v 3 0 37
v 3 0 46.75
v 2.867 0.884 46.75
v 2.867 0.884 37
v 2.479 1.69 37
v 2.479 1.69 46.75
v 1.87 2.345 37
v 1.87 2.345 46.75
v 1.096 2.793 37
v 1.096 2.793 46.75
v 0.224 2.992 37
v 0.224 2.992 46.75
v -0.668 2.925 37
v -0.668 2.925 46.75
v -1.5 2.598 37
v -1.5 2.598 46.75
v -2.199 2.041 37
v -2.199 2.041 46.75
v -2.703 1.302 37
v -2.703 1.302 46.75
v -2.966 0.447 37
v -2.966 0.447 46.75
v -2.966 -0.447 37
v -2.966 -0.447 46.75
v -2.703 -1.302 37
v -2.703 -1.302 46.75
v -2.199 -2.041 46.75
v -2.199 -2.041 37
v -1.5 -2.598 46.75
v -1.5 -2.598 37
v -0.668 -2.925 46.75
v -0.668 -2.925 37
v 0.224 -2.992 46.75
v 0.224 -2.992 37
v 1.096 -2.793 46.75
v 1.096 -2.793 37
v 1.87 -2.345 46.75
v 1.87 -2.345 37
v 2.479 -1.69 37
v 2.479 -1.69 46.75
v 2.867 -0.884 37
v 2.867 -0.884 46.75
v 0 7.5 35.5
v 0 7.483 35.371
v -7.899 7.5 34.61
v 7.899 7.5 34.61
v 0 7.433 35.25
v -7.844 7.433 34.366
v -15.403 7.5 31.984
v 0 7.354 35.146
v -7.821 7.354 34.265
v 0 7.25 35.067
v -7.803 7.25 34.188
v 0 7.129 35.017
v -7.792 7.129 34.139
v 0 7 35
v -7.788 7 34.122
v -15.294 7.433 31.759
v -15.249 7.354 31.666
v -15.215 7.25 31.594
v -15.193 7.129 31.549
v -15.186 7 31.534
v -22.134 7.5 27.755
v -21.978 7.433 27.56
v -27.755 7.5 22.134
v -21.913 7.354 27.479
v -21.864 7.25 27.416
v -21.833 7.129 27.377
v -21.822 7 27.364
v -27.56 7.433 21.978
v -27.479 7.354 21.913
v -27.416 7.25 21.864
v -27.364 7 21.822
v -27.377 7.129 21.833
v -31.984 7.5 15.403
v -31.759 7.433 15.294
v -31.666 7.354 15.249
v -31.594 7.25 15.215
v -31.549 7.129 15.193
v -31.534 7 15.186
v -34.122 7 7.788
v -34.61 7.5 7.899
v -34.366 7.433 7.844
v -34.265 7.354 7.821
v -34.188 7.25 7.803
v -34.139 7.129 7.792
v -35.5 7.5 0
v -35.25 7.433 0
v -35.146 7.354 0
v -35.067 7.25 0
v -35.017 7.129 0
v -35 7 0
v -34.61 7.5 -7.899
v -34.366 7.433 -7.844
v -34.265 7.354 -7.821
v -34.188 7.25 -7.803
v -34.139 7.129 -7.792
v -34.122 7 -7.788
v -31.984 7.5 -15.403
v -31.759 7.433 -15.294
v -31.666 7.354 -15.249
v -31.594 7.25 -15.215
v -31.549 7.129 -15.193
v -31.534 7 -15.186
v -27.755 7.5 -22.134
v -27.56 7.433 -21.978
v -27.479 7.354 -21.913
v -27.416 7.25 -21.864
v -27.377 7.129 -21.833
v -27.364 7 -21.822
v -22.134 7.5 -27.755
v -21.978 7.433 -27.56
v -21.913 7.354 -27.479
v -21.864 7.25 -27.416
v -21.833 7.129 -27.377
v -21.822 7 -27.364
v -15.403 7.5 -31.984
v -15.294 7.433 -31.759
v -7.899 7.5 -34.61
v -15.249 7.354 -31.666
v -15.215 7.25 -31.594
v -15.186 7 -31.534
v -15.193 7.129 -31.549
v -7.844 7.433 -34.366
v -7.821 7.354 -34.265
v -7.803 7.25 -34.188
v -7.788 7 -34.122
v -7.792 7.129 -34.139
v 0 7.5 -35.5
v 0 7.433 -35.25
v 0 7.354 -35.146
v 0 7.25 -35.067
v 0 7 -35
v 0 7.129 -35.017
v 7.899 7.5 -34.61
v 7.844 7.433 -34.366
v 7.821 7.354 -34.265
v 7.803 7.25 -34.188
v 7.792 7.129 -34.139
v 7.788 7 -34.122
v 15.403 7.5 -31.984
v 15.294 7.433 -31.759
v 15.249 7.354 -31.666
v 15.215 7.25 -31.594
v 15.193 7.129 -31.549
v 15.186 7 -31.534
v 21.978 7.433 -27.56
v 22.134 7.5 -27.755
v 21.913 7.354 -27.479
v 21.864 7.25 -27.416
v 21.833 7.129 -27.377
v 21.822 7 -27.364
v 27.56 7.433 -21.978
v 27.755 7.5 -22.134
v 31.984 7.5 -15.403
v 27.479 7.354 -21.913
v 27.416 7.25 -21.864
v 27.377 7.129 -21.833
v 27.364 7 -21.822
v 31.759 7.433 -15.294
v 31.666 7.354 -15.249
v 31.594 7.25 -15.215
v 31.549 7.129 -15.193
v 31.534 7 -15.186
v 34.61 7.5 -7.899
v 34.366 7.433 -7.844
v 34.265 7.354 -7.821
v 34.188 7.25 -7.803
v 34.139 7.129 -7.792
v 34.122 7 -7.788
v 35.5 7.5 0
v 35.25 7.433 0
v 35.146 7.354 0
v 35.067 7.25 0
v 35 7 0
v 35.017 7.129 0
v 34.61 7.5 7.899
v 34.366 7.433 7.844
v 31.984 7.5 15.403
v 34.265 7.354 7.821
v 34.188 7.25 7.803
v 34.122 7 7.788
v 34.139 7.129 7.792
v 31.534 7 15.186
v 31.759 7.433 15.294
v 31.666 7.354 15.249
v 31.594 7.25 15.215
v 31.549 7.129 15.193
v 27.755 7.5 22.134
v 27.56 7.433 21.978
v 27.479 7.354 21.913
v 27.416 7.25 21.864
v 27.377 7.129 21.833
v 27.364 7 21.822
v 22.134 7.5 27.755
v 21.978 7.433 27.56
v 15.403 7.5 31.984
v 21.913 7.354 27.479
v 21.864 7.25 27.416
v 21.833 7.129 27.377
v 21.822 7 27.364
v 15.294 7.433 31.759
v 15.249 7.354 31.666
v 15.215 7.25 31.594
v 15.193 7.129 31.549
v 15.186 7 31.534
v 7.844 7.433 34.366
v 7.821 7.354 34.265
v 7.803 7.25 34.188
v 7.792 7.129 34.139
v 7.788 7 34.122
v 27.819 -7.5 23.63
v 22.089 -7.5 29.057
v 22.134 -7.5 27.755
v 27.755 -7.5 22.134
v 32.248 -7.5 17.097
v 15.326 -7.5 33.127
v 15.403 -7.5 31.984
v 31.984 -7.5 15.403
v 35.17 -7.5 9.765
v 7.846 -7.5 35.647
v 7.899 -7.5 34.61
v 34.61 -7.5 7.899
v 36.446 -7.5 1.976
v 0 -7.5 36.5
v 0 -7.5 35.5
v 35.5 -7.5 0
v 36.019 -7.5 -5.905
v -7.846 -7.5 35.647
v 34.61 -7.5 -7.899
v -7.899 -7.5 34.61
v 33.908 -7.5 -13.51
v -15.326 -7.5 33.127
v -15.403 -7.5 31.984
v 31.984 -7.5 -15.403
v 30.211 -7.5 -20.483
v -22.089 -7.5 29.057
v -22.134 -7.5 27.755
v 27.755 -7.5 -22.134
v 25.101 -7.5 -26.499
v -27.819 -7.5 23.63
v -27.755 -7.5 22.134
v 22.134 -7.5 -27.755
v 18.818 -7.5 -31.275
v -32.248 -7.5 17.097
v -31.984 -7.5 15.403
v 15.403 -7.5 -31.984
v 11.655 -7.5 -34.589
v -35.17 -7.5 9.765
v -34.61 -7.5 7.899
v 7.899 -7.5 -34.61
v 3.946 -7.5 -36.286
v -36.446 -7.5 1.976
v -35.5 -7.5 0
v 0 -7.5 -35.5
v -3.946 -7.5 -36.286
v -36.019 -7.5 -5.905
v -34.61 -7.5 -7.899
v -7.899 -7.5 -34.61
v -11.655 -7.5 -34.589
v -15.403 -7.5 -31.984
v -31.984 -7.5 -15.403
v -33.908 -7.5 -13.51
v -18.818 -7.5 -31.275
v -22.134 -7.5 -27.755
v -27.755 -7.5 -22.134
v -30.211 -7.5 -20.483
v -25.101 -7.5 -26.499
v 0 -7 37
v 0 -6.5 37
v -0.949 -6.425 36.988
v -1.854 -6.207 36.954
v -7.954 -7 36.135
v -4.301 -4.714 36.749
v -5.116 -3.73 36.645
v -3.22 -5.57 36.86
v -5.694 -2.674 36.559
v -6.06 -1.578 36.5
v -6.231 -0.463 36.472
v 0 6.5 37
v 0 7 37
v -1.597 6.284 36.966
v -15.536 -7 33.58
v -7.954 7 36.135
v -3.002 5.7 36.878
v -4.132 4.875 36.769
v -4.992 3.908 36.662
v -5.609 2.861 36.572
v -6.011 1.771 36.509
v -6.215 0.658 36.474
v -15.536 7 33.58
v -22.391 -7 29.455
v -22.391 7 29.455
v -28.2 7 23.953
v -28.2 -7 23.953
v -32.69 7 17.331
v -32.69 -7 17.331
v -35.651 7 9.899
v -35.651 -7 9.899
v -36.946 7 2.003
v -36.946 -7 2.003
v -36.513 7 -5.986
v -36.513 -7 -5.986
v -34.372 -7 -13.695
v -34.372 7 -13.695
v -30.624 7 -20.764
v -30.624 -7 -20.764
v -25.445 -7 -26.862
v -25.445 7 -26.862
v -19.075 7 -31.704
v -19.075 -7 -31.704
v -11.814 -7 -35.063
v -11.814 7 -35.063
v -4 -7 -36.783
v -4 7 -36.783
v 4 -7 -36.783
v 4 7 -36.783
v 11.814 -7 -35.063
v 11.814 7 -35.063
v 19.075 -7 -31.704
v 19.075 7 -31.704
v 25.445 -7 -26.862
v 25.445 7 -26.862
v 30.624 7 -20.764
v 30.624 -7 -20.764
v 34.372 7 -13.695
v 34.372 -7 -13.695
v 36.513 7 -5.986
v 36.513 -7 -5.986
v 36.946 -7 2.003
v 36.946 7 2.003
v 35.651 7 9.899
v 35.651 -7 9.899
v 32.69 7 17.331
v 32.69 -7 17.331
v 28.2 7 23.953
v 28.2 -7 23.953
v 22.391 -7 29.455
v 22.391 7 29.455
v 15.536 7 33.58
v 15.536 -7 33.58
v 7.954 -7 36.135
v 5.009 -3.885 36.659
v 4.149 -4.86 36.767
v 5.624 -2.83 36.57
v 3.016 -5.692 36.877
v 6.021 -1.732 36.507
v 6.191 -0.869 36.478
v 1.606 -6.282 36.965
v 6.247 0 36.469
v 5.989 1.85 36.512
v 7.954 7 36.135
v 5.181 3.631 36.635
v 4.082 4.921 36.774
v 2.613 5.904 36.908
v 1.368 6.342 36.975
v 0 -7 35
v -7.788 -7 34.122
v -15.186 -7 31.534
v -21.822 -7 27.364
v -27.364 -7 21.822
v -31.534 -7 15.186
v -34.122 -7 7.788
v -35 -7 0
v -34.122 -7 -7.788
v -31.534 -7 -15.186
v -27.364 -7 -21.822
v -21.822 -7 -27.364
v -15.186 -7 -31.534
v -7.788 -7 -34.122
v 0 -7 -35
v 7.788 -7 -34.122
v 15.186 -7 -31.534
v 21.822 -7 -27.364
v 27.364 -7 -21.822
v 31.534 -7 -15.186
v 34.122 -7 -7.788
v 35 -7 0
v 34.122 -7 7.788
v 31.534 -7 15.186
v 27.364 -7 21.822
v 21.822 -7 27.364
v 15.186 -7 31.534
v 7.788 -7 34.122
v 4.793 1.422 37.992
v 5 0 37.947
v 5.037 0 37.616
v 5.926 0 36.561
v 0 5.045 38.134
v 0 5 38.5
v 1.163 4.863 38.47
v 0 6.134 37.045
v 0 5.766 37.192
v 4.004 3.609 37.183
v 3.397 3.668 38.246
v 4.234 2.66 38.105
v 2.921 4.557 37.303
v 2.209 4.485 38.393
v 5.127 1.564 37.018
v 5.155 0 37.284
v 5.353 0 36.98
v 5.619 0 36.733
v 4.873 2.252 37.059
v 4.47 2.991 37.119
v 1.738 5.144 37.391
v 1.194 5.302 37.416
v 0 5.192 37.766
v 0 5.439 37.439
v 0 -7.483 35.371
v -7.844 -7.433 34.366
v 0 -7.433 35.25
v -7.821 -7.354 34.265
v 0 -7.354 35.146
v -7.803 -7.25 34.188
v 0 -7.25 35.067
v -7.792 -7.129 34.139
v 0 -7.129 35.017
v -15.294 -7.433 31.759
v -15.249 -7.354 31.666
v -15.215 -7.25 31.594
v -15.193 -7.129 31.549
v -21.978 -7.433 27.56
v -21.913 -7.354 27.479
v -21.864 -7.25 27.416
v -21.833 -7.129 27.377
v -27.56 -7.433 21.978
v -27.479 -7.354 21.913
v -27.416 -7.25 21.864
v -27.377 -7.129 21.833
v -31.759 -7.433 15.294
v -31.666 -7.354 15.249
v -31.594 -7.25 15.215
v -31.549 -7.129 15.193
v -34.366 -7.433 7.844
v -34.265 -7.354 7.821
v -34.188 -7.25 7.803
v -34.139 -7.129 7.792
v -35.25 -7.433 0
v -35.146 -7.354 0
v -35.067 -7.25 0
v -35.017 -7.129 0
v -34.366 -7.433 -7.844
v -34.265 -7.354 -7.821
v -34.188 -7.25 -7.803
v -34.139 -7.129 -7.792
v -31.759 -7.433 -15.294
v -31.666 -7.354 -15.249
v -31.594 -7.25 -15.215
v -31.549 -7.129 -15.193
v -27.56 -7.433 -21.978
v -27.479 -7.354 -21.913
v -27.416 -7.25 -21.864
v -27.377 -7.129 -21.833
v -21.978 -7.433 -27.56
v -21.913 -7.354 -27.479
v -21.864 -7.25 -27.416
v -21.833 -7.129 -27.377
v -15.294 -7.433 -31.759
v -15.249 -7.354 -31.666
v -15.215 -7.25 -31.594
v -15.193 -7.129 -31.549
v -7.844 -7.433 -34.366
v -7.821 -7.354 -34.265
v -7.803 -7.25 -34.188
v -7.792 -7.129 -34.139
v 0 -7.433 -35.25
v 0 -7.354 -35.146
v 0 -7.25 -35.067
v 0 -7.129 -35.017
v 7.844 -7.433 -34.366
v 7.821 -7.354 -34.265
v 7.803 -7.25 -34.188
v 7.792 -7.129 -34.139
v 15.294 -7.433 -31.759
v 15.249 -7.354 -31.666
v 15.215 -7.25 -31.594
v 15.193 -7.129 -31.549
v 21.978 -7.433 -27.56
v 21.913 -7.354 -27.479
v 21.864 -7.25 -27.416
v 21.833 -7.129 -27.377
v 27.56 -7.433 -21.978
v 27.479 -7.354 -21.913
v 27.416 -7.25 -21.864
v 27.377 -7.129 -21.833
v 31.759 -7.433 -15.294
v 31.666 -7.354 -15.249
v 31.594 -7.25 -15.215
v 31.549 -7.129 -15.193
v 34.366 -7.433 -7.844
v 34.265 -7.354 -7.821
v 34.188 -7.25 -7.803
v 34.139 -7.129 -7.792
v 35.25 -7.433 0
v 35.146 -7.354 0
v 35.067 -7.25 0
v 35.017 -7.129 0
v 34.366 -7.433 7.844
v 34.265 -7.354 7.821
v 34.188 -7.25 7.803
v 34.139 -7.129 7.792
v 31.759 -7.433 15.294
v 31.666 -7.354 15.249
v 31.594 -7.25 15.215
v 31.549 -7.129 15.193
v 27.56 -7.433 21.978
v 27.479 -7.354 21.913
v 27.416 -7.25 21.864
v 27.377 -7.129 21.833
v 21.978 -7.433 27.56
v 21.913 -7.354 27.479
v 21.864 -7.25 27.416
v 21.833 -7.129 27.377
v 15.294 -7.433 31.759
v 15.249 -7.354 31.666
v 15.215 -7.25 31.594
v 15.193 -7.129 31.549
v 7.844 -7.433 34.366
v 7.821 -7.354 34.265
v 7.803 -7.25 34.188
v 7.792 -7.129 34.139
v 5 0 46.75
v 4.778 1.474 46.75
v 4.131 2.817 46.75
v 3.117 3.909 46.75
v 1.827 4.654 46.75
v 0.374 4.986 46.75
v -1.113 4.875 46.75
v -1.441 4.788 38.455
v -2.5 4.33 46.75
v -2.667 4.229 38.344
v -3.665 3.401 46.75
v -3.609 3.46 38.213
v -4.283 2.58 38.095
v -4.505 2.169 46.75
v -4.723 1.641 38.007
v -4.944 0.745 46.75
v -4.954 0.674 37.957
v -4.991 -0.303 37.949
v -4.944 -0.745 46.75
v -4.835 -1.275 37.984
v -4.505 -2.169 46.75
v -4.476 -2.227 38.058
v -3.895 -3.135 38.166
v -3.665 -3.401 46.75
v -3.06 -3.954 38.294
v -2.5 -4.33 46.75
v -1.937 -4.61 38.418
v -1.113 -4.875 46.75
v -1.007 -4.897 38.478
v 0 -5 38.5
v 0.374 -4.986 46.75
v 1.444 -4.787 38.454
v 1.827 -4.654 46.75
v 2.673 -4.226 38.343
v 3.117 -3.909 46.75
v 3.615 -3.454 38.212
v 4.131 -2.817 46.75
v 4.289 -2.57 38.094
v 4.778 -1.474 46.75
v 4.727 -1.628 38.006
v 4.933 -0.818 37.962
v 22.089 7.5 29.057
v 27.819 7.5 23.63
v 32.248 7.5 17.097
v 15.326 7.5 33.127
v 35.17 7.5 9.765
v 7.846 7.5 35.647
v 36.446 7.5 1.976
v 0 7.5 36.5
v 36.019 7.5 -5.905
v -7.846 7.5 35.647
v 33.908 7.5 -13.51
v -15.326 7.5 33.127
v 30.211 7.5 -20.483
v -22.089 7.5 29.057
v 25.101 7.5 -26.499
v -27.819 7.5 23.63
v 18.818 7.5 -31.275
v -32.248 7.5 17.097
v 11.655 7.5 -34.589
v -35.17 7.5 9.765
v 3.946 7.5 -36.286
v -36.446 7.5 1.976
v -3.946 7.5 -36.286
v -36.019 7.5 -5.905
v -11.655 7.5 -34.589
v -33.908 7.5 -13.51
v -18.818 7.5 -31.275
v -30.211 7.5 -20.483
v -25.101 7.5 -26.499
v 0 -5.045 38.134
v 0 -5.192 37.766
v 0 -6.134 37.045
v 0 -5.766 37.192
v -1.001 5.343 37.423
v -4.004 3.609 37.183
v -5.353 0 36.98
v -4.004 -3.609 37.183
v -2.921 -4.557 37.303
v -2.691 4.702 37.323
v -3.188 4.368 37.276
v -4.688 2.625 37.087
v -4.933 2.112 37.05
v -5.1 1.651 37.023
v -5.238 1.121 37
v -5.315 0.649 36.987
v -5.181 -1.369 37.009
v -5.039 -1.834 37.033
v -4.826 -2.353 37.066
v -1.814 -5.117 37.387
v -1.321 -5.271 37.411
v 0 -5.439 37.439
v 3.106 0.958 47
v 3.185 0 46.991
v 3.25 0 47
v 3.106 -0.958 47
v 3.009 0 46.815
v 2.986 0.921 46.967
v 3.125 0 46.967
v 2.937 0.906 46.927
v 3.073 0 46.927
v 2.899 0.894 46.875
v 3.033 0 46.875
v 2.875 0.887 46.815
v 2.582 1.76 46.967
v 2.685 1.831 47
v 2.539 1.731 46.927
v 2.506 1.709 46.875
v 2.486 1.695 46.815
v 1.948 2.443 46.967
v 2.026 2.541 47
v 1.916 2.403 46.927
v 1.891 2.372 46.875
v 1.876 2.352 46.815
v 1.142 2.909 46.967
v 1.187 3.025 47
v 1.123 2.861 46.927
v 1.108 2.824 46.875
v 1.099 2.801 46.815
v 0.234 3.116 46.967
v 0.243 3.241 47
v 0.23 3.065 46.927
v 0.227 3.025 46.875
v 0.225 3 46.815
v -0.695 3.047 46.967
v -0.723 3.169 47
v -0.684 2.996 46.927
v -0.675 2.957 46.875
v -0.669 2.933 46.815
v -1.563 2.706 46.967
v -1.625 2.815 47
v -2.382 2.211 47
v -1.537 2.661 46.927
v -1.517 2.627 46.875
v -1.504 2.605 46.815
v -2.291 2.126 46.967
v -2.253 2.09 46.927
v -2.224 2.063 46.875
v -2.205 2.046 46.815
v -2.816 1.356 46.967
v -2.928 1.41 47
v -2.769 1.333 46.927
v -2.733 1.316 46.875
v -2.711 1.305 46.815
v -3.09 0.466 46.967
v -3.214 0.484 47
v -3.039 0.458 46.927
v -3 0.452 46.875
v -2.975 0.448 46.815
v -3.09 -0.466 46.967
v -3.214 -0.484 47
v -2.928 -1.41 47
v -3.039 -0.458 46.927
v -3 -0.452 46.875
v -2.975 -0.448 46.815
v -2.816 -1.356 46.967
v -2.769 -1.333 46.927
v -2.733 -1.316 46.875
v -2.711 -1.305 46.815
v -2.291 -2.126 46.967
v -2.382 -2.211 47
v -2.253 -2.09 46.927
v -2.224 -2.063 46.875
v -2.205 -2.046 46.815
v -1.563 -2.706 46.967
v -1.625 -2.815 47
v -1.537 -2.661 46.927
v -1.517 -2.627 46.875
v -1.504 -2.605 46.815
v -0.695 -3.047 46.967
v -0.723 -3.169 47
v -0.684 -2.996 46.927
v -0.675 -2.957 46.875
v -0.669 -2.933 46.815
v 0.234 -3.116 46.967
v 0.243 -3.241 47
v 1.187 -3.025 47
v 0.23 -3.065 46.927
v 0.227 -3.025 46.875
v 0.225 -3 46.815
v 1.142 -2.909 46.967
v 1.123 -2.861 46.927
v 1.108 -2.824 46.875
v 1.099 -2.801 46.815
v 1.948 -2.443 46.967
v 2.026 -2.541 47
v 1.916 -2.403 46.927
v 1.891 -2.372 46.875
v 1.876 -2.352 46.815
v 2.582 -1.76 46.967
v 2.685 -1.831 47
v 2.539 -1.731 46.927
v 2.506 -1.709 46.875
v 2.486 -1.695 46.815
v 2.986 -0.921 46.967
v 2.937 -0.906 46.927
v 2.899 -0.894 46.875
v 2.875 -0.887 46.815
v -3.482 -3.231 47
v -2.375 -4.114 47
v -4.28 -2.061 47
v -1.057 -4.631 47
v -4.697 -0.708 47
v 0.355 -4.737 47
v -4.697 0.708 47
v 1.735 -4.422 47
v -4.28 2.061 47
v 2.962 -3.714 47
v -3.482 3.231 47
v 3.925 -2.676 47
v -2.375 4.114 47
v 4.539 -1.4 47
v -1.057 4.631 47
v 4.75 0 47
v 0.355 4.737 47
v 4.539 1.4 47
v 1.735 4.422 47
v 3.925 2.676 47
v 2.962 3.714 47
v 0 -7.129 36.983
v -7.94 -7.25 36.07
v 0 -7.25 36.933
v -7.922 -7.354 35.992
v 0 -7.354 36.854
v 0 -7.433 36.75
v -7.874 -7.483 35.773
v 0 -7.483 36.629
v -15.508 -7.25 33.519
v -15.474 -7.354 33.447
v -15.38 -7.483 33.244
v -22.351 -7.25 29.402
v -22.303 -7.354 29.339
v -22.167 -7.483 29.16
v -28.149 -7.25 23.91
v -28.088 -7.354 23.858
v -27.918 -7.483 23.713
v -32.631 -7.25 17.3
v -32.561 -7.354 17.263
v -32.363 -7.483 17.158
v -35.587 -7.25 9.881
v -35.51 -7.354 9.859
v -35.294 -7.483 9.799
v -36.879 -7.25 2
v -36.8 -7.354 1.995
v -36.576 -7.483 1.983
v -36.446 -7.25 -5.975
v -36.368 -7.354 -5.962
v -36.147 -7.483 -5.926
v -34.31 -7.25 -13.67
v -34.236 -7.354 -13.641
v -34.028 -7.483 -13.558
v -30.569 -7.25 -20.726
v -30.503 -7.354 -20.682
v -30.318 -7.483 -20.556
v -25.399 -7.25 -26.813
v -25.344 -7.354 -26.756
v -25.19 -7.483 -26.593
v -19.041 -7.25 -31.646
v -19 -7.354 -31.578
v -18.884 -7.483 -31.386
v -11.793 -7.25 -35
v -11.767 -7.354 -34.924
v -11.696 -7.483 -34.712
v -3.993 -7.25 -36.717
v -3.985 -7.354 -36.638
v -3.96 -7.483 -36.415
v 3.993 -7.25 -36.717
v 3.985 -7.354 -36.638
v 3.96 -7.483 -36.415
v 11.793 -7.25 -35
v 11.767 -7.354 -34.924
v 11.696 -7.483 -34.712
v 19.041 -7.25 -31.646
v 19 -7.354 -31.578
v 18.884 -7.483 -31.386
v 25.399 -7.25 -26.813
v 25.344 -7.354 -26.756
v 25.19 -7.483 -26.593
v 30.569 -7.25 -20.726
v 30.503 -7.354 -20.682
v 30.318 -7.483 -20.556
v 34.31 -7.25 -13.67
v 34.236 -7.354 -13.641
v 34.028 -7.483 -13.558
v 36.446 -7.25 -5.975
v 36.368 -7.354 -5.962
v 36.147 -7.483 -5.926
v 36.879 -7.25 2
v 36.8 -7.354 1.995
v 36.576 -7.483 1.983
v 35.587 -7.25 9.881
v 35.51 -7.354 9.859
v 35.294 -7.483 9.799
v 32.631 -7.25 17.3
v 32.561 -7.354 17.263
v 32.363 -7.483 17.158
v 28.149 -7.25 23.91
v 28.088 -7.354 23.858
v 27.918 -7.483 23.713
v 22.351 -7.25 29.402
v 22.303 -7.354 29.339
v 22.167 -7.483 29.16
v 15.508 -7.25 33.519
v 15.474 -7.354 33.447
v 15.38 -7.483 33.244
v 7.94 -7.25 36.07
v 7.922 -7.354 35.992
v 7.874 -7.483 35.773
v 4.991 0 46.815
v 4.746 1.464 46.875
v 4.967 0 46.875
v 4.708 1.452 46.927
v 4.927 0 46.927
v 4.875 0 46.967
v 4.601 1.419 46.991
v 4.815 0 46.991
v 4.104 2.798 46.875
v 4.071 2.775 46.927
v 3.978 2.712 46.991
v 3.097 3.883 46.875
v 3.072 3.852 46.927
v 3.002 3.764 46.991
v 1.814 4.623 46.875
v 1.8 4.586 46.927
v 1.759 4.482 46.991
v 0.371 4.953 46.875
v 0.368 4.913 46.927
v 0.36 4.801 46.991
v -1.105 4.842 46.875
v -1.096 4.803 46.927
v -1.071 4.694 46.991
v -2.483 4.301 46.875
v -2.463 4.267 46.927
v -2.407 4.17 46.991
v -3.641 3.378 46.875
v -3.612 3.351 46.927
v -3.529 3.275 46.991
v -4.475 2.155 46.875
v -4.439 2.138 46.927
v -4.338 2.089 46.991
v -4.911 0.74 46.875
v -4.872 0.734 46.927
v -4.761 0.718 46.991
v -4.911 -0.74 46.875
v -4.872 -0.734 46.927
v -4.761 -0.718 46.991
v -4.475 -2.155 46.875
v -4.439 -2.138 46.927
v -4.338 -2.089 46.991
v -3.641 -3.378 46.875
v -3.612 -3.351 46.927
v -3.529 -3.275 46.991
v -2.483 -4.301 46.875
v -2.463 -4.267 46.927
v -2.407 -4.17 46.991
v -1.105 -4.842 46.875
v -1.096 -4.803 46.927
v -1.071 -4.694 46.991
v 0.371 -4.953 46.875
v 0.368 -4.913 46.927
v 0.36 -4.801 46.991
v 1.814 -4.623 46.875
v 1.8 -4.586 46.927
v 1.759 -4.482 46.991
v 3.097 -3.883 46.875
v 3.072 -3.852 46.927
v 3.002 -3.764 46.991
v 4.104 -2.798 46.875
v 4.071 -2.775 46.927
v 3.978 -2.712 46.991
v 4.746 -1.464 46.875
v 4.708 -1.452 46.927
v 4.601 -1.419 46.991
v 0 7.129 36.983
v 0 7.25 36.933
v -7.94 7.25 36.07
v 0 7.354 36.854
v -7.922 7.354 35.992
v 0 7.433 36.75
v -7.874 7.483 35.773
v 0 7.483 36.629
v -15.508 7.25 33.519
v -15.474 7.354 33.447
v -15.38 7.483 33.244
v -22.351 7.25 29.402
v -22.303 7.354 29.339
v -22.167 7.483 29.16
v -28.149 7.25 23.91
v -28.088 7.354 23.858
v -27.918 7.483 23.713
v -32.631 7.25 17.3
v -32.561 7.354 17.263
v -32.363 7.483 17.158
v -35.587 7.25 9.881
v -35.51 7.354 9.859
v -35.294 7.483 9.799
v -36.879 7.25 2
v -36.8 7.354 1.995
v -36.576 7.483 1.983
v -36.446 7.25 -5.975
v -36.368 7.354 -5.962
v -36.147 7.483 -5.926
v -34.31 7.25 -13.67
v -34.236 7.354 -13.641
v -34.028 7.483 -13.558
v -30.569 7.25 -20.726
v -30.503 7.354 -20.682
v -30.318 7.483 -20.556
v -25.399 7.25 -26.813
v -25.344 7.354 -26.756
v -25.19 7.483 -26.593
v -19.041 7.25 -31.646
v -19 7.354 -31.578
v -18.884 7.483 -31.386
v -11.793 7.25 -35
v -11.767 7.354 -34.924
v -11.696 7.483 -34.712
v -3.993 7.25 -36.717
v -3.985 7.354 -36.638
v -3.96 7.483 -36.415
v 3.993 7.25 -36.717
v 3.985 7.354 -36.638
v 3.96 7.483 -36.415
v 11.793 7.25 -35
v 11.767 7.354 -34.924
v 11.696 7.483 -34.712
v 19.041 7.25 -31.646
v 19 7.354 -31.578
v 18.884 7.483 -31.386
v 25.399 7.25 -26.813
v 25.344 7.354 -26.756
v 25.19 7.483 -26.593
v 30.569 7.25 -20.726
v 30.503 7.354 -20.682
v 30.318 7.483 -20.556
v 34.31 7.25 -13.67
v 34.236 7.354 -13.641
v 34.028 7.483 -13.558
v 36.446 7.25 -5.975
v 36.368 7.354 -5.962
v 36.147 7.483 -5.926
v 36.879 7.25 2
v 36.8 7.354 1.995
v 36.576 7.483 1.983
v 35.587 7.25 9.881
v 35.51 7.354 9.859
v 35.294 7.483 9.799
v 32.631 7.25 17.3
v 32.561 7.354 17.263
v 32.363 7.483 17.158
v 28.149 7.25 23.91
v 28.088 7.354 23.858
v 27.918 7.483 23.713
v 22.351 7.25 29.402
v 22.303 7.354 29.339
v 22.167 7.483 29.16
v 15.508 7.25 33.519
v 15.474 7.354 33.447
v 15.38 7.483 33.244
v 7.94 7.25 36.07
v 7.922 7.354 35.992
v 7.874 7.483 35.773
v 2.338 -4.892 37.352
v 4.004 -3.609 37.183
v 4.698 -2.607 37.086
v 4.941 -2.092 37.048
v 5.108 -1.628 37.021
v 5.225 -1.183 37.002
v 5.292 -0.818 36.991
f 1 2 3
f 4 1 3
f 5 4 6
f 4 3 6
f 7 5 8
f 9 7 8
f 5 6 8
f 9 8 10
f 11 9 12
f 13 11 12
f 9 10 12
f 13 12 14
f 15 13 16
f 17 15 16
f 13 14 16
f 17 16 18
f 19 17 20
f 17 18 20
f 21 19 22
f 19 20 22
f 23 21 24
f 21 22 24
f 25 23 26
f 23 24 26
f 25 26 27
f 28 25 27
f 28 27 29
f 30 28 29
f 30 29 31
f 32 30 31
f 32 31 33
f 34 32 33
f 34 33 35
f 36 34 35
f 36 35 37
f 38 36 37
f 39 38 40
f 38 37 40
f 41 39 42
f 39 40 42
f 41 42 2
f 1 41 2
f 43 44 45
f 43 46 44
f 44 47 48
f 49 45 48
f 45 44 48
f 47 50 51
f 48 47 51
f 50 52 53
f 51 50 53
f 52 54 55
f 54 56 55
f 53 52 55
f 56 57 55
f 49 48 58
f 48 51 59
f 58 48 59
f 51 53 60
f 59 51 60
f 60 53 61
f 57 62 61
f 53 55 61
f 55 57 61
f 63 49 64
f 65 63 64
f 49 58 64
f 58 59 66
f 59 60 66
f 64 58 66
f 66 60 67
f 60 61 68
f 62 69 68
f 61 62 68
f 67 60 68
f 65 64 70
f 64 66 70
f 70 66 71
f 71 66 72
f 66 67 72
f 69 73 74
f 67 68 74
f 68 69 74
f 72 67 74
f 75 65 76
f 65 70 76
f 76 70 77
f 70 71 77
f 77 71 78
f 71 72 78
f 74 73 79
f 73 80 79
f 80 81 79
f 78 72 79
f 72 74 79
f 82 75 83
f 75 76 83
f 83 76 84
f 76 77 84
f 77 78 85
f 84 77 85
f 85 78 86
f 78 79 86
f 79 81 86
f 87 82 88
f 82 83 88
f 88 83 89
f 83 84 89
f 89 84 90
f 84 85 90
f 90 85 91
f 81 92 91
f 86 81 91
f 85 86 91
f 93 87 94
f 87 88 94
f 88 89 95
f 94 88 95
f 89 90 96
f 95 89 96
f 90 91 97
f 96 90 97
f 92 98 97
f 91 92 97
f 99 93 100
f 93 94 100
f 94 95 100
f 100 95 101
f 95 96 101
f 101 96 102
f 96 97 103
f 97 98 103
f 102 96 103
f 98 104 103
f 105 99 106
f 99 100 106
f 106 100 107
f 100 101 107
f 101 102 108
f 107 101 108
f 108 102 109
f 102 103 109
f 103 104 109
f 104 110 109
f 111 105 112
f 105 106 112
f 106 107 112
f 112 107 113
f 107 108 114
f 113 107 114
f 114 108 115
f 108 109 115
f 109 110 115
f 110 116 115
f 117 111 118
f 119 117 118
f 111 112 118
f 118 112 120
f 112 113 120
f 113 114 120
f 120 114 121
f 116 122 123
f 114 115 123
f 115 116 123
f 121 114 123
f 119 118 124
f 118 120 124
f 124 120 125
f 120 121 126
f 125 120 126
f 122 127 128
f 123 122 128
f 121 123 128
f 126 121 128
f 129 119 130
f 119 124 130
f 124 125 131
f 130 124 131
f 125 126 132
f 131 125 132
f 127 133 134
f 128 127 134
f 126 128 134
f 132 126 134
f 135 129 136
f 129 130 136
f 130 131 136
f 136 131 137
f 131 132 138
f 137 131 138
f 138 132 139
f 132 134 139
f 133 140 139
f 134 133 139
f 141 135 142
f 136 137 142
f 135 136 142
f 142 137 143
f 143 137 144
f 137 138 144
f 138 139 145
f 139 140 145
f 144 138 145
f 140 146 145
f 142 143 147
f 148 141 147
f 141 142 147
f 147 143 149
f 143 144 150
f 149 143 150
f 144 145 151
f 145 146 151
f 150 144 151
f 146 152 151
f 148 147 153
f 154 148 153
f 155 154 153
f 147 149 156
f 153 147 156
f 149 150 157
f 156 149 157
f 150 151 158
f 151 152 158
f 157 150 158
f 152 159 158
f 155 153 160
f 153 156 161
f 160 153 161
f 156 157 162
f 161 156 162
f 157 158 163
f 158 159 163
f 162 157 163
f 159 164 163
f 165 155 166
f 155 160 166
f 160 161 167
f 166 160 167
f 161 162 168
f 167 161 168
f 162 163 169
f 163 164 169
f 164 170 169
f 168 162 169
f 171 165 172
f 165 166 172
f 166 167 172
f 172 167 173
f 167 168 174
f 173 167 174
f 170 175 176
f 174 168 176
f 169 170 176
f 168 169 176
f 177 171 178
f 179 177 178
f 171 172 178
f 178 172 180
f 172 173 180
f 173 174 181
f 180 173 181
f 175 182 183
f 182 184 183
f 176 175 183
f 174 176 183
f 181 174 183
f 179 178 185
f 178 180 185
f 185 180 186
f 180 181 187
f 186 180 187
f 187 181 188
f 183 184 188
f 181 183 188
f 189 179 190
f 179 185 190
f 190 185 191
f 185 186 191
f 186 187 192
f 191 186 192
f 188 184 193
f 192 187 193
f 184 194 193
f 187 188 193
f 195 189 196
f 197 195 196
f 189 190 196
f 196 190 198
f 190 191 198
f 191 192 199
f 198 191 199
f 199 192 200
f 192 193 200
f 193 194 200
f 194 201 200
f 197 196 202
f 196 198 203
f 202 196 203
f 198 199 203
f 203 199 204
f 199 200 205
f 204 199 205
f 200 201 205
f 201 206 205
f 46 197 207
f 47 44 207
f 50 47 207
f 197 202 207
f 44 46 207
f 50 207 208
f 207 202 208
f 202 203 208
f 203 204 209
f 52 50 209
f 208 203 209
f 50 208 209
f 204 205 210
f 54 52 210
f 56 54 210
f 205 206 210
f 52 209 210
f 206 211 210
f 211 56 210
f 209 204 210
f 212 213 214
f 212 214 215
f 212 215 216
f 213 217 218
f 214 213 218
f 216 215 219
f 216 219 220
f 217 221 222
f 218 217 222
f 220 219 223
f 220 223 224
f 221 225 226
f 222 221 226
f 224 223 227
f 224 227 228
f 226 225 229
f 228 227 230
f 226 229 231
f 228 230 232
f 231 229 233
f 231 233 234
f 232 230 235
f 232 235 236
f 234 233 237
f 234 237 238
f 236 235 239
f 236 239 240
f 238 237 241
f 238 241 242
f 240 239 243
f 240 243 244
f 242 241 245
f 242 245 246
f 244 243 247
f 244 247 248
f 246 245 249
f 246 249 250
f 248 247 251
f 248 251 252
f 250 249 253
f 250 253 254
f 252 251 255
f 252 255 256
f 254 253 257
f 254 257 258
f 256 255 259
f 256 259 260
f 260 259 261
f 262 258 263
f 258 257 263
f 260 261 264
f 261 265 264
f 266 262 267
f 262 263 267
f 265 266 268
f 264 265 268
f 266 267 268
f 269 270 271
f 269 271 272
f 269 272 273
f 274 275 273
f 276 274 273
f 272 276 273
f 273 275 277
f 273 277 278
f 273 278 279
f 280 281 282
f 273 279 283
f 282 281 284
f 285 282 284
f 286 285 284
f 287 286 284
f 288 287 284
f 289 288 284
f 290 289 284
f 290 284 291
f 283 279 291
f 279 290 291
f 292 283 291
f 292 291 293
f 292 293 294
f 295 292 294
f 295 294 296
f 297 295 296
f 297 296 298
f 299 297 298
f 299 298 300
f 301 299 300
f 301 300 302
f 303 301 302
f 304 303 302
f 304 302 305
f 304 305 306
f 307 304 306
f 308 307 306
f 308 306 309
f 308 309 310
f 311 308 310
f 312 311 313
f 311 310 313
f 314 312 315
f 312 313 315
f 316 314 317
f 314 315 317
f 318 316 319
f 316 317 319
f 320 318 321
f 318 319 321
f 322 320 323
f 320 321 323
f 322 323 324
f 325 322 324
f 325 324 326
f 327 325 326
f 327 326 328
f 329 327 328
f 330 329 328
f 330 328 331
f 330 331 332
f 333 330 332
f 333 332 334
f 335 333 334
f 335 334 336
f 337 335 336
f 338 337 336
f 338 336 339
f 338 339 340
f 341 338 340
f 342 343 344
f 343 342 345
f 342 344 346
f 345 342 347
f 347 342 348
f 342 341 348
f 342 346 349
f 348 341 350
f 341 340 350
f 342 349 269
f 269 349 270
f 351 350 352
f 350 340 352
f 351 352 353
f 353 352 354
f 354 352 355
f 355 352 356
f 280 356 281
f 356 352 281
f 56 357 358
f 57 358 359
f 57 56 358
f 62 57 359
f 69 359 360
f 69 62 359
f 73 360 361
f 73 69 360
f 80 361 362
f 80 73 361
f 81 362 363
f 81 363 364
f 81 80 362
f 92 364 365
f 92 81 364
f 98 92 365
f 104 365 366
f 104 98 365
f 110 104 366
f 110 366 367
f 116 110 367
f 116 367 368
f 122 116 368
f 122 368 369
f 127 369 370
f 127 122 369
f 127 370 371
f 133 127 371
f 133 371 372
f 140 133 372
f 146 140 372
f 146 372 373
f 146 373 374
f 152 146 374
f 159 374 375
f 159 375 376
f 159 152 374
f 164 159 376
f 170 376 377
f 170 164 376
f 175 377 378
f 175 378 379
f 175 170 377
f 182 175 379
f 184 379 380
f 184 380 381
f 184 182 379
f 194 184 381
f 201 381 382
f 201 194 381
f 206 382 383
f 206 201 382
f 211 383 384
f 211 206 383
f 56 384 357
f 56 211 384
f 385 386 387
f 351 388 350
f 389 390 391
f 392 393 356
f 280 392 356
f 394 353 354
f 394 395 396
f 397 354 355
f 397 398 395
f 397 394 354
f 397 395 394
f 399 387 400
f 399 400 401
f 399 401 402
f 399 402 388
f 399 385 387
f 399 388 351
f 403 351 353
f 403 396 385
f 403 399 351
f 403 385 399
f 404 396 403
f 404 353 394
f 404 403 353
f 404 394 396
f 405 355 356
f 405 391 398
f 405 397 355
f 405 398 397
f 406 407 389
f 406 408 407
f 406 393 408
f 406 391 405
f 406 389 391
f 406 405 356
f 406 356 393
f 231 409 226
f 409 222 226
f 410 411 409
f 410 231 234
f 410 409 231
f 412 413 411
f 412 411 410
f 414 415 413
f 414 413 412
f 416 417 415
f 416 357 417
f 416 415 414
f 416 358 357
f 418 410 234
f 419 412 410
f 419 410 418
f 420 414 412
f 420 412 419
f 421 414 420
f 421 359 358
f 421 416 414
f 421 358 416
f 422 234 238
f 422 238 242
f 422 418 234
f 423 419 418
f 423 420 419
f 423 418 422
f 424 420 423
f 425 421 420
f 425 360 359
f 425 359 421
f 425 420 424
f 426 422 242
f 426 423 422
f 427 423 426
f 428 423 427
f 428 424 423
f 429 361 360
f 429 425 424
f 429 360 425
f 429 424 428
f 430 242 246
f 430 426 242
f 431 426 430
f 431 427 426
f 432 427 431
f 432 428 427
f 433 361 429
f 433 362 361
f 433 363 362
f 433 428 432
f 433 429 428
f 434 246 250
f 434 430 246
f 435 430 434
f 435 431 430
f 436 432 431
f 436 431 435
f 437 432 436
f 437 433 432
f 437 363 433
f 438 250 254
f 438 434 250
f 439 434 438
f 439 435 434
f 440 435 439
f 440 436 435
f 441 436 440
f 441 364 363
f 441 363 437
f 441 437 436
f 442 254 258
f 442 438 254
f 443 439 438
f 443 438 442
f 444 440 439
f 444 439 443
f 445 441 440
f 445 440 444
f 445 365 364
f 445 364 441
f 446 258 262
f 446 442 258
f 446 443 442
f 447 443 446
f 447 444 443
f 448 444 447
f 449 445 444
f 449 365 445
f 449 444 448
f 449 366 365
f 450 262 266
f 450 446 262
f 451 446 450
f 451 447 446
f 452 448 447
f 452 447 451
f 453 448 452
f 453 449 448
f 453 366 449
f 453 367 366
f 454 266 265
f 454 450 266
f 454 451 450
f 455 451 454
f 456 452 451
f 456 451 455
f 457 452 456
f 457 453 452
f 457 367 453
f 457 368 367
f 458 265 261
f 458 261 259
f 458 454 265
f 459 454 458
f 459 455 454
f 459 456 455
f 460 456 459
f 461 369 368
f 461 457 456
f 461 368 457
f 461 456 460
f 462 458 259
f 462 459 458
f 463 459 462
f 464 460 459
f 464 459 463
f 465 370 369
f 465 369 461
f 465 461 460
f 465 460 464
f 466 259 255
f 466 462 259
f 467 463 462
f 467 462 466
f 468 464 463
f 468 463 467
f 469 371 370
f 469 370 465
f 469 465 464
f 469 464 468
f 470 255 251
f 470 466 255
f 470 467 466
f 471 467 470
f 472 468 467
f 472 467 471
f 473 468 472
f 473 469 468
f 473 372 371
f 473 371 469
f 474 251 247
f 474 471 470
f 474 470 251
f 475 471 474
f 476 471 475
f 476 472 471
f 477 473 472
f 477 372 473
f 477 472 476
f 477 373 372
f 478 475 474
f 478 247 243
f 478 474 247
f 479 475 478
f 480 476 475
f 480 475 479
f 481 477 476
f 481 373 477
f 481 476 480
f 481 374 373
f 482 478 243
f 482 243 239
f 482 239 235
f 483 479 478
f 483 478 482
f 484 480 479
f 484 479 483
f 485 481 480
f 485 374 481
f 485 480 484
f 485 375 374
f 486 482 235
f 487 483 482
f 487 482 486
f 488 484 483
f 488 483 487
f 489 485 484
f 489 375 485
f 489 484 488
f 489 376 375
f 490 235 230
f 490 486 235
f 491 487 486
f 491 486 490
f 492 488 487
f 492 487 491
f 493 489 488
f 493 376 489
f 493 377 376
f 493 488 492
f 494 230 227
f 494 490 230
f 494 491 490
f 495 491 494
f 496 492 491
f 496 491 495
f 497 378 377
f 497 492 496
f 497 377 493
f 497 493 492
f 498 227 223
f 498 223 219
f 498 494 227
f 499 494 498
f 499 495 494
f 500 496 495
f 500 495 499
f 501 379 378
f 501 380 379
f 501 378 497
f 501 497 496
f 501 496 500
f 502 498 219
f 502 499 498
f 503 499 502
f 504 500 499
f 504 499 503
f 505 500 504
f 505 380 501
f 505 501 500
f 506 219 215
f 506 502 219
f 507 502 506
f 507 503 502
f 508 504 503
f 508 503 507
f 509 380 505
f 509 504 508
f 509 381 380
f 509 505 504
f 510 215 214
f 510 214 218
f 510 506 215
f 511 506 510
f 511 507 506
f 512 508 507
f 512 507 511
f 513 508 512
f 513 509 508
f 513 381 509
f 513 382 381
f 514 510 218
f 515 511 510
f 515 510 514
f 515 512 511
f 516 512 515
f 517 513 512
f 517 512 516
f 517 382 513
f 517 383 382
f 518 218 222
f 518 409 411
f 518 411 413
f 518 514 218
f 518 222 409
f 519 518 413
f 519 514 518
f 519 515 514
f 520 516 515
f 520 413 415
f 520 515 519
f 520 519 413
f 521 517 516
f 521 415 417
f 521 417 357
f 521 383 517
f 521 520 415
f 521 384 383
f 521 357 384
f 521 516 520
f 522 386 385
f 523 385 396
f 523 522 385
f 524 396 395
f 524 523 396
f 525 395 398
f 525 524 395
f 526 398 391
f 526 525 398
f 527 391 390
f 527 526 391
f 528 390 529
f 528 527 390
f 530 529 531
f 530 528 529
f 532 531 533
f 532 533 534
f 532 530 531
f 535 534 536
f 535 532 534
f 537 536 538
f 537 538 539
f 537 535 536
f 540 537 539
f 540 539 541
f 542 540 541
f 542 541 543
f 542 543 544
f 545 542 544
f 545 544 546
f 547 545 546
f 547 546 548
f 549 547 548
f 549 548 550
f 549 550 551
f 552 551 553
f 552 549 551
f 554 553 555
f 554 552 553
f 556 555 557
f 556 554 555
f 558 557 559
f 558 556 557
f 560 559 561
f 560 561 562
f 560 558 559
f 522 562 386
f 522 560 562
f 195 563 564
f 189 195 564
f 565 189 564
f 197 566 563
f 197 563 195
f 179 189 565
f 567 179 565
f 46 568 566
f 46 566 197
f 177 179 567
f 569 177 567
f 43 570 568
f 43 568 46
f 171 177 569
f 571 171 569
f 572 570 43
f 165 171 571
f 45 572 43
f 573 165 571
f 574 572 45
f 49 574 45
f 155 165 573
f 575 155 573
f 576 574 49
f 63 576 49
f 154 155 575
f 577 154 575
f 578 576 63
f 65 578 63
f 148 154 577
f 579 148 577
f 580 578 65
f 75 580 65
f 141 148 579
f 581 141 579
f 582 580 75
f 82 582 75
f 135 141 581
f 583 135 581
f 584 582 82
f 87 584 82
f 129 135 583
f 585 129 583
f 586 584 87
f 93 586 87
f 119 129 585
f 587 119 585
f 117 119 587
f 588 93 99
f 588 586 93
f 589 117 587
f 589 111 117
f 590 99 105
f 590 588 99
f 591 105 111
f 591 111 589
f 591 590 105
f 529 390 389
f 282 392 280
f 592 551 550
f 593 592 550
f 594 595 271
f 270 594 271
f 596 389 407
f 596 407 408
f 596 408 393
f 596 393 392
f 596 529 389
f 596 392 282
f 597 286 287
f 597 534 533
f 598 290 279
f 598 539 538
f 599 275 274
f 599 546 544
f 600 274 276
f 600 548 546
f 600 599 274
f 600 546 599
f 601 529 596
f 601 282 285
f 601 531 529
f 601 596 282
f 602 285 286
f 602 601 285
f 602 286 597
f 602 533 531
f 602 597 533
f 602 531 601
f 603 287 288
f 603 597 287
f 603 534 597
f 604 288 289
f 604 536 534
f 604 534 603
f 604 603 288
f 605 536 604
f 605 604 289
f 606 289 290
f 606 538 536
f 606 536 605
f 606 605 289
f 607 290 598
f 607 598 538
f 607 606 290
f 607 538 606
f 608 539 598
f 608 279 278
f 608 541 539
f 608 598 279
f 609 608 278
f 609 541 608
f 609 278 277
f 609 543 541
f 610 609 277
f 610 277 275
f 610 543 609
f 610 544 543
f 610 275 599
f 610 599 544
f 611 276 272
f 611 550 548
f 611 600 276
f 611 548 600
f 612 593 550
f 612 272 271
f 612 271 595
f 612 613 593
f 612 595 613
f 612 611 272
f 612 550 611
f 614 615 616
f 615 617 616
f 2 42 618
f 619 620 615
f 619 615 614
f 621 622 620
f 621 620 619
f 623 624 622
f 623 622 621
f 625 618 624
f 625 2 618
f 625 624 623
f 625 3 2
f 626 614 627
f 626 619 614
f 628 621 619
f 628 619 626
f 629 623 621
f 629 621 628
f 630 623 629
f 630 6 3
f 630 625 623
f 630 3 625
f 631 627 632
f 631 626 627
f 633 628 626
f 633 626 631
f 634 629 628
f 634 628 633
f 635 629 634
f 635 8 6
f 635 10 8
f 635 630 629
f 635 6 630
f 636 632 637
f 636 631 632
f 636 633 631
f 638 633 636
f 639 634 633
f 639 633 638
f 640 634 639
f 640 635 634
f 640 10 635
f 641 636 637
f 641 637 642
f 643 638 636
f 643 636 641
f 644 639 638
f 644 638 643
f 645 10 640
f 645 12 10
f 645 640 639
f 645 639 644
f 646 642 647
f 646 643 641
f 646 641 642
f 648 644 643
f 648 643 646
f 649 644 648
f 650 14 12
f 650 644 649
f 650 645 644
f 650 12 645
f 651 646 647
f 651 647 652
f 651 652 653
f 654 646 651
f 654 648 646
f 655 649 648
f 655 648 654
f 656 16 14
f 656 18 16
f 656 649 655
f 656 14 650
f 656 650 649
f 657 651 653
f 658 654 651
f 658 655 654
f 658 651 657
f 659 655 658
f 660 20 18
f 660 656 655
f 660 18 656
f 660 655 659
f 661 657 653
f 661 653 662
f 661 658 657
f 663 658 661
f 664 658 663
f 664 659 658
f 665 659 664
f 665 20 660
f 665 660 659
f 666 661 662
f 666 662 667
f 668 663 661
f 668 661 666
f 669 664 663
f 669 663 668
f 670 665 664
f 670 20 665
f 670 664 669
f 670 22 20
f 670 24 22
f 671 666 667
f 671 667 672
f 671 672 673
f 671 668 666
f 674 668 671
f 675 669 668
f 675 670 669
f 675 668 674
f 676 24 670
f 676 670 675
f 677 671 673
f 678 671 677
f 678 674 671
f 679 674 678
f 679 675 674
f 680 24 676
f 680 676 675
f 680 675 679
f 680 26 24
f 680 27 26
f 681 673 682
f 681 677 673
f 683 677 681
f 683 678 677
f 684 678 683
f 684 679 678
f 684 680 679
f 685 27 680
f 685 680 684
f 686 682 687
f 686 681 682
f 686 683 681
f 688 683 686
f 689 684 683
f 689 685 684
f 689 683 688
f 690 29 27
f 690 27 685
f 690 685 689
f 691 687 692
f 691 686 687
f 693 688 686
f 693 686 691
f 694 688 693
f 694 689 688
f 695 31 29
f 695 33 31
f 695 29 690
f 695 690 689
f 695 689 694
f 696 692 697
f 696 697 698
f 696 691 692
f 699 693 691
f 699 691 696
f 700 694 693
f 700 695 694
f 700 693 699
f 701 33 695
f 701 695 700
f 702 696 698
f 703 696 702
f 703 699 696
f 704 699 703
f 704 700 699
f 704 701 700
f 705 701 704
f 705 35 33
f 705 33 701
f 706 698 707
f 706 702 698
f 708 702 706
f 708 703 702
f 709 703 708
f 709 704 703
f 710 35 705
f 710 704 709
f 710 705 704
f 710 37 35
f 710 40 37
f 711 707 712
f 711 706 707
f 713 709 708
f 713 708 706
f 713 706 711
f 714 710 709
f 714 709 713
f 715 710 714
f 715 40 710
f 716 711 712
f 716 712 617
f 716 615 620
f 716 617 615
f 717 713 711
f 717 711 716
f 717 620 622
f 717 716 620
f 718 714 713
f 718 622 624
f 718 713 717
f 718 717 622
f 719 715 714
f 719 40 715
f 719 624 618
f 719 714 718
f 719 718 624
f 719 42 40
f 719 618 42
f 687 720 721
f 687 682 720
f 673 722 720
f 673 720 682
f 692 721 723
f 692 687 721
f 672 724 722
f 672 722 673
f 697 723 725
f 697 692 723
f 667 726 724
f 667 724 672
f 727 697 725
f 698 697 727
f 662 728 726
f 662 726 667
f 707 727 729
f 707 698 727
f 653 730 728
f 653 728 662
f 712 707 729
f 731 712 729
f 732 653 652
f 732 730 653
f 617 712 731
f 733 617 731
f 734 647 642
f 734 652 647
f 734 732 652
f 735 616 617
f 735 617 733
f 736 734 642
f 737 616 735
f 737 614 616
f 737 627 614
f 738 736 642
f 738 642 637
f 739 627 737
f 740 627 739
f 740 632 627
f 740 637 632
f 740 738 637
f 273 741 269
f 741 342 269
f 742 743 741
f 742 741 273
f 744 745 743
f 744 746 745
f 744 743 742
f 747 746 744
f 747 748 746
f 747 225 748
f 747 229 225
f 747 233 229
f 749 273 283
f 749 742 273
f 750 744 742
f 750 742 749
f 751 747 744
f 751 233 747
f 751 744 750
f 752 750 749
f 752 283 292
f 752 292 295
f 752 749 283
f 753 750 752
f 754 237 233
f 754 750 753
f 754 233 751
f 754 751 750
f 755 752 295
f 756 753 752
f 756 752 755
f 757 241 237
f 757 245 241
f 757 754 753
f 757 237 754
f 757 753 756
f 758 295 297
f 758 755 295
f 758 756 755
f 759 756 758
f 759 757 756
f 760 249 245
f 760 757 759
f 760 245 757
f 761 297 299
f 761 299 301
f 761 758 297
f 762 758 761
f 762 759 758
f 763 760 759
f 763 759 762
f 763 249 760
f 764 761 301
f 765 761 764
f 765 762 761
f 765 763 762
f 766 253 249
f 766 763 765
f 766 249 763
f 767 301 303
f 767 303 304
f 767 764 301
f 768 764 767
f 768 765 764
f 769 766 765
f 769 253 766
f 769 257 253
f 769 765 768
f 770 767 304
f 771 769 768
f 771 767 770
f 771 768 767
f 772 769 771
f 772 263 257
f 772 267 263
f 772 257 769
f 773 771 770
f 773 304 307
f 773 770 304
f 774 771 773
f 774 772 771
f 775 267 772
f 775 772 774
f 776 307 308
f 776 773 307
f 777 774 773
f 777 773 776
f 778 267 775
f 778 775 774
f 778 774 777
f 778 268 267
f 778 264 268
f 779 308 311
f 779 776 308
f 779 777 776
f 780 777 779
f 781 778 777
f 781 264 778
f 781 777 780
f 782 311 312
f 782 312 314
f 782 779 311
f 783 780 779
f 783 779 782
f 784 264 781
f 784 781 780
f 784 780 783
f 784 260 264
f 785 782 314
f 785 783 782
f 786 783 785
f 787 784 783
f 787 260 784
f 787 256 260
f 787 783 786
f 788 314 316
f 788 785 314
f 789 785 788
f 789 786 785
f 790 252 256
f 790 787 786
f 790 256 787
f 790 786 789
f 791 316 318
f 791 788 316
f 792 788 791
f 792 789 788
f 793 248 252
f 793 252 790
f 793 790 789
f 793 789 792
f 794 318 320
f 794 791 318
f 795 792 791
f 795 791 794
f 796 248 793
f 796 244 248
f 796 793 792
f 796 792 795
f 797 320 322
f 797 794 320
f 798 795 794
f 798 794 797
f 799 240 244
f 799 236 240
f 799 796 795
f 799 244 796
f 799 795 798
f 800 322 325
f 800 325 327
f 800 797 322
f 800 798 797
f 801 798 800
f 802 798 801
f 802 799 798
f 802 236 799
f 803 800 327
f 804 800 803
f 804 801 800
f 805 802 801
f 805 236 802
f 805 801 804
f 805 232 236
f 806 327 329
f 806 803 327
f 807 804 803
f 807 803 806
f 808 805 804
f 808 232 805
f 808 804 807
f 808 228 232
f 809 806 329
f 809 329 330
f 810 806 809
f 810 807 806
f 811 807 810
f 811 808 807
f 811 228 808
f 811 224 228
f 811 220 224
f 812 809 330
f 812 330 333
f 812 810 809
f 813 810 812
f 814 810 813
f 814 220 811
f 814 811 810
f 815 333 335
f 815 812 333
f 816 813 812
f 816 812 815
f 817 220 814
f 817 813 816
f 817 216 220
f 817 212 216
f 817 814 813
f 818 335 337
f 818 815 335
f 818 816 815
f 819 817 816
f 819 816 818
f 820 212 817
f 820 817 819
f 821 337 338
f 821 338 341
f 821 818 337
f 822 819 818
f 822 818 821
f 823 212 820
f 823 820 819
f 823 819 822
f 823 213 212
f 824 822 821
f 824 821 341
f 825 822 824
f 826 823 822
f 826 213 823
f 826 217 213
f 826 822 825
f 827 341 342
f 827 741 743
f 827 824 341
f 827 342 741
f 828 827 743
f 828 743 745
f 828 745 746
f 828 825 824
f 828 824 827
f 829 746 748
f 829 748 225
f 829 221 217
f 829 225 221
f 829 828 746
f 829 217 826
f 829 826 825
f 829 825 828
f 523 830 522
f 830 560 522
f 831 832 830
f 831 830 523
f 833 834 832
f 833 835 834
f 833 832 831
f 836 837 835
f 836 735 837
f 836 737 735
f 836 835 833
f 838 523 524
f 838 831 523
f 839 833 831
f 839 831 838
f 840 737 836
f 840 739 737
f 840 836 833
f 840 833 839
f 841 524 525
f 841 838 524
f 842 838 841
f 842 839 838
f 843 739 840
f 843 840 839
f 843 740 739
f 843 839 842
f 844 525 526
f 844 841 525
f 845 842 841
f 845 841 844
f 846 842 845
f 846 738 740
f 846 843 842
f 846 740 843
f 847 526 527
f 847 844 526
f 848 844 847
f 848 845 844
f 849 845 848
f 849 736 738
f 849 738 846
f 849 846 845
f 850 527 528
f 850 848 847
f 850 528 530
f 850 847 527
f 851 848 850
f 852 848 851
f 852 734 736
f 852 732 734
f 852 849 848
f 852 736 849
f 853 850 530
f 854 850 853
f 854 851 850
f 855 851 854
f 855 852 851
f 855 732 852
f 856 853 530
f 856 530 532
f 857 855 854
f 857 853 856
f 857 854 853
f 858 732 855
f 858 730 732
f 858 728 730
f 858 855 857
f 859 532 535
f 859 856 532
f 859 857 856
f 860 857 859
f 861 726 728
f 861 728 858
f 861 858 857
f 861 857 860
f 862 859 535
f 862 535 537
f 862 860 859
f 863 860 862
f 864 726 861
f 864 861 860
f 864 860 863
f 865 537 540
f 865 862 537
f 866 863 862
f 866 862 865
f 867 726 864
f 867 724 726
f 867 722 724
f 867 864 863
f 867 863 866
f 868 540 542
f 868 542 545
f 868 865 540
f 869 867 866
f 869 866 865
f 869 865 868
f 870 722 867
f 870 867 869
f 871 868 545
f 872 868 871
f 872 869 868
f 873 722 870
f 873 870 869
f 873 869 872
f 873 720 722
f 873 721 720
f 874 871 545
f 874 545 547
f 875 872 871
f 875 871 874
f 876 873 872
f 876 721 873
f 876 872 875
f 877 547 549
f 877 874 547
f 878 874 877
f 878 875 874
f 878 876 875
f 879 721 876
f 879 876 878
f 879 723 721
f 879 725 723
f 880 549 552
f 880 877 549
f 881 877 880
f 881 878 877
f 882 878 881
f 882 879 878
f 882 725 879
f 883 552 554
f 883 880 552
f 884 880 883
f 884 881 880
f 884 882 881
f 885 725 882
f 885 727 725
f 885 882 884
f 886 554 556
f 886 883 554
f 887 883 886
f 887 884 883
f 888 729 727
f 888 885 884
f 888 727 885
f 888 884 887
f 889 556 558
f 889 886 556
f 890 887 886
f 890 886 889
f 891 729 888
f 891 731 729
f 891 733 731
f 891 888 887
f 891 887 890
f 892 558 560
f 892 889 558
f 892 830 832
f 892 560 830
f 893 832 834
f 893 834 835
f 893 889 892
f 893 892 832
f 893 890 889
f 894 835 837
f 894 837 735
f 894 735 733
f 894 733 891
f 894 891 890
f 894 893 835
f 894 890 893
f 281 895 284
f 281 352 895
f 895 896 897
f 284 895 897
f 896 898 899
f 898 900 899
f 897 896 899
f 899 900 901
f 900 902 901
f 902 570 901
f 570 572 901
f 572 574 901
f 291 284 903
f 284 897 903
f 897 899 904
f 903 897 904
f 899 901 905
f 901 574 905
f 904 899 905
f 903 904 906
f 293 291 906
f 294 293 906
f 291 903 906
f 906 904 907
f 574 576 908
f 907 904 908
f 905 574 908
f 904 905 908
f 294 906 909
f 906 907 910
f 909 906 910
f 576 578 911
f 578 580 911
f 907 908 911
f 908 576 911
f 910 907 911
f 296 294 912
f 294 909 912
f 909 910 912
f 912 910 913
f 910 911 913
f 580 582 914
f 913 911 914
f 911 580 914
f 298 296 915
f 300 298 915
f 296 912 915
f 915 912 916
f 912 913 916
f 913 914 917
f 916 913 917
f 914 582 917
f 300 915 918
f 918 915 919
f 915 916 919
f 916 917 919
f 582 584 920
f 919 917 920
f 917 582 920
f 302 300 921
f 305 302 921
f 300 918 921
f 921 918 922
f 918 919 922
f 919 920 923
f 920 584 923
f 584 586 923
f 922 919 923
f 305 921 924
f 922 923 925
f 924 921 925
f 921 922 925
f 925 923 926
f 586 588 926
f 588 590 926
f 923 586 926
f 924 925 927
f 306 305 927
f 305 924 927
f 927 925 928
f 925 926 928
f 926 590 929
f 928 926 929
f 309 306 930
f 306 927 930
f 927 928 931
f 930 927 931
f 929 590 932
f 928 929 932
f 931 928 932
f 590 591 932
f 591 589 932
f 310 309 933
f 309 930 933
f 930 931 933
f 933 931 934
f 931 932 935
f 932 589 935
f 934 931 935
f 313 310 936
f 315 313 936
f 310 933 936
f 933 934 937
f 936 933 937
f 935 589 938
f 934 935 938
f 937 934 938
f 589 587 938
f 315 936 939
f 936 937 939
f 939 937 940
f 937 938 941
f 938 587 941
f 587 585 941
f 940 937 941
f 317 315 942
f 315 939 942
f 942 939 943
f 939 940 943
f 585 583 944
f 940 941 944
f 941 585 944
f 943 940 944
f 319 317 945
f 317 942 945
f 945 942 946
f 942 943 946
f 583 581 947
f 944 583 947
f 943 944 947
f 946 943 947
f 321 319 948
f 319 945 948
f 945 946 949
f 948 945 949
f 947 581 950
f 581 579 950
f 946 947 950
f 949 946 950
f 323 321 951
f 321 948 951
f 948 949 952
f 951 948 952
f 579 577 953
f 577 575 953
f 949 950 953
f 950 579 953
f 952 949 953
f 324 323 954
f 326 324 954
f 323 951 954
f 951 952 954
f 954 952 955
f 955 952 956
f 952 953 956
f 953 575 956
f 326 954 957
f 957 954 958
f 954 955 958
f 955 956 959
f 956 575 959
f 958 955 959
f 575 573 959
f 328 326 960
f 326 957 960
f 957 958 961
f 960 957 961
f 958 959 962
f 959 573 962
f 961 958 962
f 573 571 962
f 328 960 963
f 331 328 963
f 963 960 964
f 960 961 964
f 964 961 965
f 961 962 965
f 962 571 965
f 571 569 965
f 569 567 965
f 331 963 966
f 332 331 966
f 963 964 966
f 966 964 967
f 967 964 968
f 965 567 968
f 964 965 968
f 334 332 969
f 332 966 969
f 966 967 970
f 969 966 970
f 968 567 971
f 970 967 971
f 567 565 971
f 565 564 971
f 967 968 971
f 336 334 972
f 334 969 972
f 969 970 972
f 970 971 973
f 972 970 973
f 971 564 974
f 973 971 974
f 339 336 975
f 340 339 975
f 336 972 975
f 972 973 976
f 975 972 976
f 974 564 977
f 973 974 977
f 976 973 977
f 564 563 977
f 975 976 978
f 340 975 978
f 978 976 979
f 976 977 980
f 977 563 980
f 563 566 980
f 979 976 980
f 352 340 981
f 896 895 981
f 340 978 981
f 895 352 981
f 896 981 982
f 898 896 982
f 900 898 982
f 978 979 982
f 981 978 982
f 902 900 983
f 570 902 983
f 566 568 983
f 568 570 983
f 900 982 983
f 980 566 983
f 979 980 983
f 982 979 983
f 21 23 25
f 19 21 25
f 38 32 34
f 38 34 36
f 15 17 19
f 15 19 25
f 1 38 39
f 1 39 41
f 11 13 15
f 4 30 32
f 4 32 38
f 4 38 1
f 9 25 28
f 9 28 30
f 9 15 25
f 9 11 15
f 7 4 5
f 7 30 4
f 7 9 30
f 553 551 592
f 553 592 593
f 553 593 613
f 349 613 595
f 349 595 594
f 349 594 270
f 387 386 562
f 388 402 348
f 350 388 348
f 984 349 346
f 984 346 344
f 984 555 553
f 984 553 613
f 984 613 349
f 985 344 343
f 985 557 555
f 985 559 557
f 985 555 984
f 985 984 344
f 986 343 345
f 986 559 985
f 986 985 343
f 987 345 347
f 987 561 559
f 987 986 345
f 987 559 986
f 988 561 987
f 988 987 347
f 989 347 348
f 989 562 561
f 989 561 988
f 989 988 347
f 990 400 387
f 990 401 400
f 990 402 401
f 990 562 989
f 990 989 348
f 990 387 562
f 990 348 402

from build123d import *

# Parameters (mm, degrees)
SKETCH1_W                = 2
SKETCH1_H                = 15
BOSS_EXTRUDE1_REACH      = 94.094
BOSS_EXTRUDE1_END_RADIUS = 37
SKETCH2_R                = 5
SKETCH4_R                = 3
CUT_EXTRUDE1_DEPTH       = 10
FILLET2_R                = 0.25
FILLET3_R                = 1.5
FILLET4_R                = 0.5


with BuildPart() as part:
    # Sketch1 → Revolve1 (revolve)
    with BuildSketch(Plane.XY, mode=Mode.PRIVATE) as revolve1_sk:
        with Locations((36, 0)):
            Rectangle(SKETCH1_W, SKETCH1_H)
    revolve(revolve1_sk.sketch.rotate(Axis((0, 15.259118644, 0), (0, -1, 0)), 90), axis=Axis((0, 15.259118644, 0), (0, -1, 0)))

    # Boss-Extrude1: up to this cylinder (the profile starts outside it)
    boss_extrude1_end = Plane(origin=(0, 0, 0), z_dir=(0, 1, 0)) * Cylinder(BOSS_EXTRUDE1_END_RADIUS, 263.188, mode=Mode.PRIVATE)
    # Sketch2 → Boss-Extrude1 (add, up to the surface)
    with BuildSketch(Plane.XY.offset(47), mode=Mode.PRIVATE) as boss_extrude1_sk1:
        Circle(SKETCH2_R)
    boss_extrude1_tool1 = extrude(boss_extrude1_sk1.sketch, amount=-BOSS_EXTRUDE1_REACH, mode=Mode.PRIVATE) - boss_extrude1_end
    add(boss_extrude1_tool1.solids().sort_by_distance((0, 0, 47))[0])

    # Sketch4 → Cut-Extrude1 (cut)
    with BuildSketch(Plane.XY.offset(47)):
        Circle(SKETCH4_R)
    extrude(amount=-CUT_EXTRUDE1_DEPTH, mode=Mode.SUBTRACT)

    # Fillet2
    fillet2_edges = [part.edges().sort_by_distance(p)[0] for p in [
        (-5, 0, 47),
        (-3, 0, 47),
    ]]
    fillet(fillet2_edges, radius=FILLET2_R)

    # Fillet3
    fillet3_edges = [part.edges().sort_by_distance(p)[0] for p in [
        (-5, 0, 36.66060556),
    ]]
    fillet(fillet3_edges, radius=FILLET3_R)

    # Fillet4
    fillet4_edges = [part.edges().sort_by_distance(p)[0] for p in [
        (0, 7.5, -35),
        (0, 7.5, -37),
        (0, -7.5, -37),
        (0, -7.5, -35),
    ]]
    fillet(fillet4_edges, radius=FILLET4_R)


solid = part.part
